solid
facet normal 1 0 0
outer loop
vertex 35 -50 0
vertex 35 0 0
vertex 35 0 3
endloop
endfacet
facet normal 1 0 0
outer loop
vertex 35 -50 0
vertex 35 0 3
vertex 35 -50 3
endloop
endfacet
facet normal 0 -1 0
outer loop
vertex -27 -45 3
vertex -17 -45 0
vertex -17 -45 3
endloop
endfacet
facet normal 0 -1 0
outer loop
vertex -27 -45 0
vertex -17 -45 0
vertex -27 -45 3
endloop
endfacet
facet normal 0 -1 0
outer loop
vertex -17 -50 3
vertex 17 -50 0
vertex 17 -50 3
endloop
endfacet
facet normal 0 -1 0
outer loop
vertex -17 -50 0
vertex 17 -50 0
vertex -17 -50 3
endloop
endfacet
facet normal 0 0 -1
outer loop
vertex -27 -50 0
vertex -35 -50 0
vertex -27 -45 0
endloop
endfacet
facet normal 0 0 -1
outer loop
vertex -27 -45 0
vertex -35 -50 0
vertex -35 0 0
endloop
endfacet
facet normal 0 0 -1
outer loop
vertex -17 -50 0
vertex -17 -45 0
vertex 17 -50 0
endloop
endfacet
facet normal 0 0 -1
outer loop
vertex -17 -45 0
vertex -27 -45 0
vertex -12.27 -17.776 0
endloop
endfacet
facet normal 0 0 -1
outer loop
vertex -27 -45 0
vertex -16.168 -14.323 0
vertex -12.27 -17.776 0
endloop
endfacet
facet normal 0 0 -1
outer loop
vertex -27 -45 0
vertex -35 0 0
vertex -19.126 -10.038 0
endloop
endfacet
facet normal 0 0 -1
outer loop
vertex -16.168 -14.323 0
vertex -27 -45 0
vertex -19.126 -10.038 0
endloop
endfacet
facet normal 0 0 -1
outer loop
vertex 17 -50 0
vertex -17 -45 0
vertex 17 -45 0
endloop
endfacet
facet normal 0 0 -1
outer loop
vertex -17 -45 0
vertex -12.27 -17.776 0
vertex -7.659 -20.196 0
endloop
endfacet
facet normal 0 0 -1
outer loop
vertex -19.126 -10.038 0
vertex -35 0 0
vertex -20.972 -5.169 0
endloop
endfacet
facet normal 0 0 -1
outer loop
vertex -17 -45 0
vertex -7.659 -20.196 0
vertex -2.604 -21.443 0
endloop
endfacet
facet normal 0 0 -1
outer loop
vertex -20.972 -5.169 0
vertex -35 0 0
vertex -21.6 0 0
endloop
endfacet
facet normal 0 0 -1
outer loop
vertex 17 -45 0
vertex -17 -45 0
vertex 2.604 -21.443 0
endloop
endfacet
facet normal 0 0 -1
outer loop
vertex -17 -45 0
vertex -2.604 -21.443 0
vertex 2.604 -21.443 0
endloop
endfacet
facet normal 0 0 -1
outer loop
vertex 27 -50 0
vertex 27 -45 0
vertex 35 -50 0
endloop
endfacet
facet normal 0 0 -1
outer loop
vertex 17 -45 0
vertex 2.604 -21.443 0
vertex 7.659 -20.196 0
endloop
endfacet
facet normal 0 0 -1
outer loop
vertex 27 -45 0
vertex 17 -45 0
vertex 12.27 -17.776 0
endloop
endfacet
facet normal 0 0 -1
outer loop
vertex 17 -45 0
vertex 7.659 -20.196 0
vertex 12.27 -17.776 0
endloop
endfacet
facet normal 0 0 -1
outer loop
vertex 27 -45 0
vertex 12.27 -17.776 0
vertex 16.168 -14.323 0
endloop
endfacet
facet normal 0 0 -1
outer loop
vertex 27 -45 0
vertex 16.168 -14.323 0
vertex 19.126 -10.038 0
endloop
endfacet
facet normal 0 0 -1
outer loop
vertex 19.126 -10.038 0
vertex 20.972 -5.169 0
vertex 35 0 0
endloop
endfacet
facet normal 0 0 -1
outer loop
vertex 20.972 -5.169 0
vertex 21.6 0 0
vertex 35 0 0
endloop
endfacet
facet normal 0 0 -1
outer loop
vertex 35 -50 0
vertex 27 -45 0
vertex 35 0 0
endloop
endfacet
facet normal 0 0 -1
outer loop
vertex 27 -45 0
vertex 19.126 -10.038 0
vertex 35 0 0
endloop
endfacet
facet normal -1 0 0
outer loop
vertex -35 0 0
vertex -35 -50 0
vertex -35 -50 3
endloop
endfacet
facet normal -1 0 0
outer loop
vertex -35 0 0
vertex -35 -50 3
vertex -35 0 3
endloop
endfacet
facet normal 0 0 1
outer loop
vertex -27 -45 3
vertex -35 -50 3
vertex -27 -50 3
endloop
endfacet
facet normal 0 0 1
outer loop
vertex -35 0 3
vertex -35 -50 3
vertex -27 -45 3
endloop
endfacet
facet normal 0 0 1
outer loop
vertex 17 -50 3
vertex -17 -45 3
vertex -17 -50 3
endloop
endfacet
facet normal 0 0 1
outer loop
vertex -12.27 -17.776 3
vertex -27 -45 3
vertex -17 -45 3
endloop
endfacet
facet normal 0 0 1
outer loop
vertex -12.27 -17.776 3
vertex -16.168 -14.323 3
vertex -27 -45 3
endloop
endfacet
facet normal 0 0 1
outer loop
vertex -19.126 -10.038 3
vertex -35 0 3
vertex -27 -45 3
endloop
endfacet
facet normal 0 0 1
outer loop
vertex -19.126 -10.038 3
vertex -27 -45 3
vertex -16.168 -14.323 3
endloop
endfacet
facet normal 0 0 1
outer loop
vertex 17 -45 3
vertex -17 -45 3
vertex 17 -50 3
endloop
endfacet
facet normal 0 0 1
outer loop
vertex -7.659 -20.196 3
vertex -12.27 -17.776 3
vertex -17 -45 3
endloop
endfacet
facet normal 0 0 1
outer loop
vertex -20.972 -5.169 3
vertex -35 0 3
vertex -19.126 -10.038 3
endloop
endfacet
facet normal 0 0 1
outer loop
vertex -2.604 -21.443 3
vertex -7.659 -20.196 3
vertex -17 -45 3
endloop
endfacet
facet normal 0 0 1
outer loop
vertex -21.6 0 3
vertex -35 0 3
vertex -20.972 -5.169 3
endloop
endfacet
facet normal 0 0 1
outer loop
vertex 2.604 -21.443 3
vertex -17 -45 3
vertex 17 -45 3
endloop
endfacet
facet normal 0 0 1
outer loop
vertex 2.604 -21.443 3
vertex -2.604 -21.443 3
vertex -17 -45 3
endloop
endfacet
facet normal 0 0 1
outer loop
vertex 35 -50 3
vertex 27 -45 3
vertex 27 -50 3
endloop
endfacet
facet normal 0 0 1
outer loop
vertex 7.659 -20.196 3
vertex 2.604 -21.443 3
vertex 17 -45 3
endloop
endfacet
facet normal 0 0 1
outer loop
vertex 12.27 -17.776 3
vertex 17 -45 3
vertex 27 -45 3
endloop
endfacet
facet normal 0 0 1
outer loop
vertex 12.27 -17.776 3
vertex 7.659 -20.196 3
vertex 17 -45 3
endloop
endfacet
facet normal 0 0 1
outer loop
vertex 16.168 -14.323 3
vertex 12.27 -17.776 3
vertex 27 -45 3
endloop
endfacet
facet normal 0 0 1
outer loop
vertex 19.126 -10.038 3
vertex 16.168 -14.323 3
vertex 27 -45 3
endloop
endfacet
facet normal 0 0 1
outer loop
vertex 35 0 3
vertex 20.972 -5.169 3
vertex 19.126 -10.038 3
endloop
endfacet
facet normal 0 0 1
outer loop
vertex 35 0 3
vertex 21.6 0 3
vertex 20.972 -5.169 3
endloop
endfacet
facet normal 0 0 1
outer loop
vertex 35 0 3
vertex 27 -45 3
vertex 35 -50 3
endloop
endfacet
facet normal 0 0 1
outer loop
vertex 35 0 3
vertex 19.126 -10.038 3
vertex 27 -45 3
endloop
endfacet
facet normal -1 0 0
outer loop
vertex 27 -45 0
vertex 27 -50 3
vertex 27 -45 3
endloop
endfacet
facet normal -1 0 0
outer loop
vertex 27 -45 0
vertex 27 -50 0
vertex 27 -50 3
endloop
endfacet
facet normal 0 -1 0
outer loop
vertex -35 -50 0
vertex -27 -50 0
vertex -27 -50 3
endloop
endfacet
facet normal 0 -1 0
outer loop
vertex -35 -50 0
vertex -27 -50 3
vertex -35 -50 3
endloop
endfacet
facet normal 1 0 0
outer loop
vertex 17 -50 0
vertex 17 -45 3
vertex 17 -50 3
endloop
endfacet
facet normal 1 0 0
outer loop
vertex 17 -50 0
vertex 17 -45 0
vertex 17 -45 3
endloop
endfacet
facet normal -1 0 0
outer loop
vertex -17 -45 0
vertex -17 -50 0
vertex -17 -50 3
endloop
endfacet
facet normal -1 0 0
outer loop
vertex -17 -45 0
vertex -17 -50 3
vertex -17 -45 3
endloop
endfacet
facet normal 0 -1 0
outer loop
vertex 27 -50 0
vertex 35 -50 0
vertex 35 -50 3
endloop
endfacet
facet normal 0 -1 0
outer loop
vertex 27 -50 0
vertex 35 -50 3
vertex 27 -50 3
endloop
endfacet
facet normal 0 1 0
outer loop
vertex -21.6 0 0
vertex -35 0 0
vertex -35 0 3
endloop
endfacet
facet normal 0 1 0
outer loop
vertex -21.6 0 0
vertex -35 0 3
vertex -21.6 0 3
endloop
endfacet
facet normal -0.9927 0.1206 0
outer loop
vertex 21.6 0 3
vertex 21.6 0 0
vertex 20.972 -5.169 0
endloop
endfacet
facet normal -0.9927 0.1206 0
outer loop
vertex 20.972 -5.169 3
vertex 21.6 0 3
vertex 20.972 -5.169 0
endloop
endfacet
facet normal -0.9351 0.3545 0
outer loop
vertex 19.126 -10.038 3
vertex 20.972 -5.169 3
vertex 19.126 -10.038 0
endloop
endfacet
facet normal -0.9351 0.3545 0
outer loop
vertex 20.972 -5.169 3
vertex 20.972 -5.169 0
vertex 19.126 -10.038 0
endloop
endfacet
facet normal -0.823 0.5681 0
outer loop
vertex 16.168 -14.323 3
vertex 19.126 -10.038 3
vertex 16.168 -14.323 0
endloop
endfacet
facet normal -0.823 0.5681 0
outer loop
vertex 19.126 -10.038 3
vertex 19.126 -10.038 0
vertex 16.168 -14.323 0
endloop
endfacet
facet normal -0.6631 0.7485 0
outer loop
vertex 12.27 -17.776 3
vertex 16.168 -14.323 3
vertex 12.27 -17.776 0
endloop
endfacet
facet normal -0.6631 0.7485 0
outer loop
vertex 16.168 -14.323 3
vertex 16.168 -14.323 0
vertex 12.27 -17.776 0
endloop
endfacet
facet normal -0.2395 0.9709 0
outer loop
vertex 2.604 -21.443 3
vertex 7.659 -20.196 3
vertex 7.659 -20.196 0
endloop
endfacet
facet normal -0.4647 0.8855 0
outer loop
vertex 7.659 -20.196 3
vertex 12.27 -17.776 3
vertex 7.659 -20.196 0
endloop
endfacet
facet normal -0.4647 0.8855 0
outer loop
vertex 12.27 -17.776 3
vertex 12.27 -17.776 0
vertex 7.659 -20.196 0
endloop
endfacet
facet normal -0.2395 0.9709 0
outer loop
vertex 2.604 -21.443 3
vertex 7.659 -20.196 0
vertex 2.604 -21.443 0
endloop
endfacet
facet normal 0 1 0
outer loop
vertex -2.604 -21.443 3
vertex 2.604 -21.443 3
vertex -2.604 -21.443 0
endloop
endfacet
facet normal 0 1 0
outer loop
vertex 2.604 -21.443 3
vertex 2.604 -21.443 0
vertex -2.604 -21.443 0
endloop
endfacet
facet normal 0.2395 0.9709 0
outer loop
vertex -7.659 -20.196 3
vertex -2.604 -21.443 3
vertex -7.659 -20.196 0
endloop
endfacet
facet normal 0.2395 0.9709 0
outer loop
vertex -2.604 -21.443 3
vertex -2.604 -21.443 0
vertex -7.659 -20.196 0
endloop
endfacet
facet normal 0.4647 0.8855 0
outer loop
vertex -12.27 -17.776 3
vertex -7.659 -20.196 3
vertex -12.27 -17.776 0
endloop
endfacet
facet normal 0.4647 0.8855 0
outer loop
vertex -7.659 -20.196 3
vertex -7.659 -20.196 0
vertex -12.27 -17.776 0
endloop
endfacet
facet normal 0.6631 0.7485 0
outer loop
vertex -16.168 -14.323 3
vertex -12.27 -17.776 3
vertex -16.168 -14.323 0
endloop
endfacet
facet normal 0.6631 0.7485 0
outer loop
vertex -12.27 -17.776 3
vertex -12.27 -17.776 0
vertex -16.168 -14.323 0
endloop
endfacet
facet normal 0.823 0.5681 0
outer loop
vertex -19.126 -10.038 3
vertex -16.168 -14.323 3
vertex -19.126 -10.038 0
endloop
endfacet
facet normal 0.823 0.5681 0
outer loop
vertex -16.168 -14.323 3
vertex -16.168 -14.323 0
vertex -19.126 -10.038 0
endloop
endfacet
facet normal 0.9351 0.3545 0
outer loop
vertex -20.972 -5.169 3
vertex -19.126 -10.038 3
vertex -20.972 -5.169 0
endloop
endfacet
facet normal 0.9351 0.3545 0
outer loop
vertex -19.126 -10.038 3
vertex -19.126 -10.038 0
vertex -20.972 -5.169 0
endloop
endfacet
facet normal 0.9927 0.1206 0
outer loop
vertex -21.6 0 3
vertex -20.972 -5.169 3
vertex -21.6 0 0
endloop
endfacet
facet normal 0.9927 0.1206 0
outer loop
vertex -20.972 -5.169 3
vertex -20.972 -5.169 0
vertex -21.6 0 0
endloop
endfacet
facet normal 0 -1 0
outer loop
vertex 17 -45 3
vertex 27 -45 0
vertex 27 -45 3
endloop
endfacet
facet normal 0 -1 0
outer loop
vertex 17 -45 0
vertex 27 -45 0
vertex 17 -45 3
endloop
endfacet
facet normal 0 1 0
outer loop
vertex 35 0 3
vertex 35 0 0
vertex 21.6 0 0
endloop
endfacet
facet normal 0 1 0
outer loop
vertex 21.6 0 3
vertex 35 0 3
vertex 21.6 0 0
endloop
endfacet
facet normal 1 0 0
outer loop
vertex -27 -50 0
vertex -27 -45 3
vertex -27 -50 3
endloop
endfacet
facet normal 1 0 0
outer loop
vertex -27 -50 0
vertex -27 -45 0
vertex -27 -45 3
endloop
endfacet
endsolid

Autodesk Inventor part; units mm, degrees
ref_plane "YZ Plane" through (0, 0, 0) normal (1, 0, 0) x (0, 1, 0)
ref_plane "XZ Plane" through (0, 0, 0) normal (0, 1, 0) x (-1, 0, 0)
ref_plane "XY Plane" through (0, 0, 0) normal (0, 0, 1) x (1, 0, 0)
sketch "Esquisse1" plane through (0, 0, 0) normal (0, 0, 1) x (1, 0, 0)
  line L0 (0, -14) -> (0, 14) construction
  circle A0 centre (0, 0) radius 30 construction
  line L1 (0, 0) -> (35, 0) construction
  line L2 (0, 0) -> (-35, 0) construction
  line L3 (-35, 0) -> (35, 0) construction
  line L4 (35, 0) -> (35, -50)
  line L5 (-35, -50) -> (-35, 0)
  line L6 (-49, 0) -> (49, 0) construction
  line L7 (0, -66) -> (0, 46) construction
  arc A1 (-21.6, 0) -> (21.6, 0) centre (0, 0) ccw
  line L8 (-35, 0) -> (-21.6, 0)
  line L9 (35, 0) -> (21.6, 0)
  line L10 (-17, -50) -> (-17, -45)
  line L11 (-17, -45) -> (-27, -45)
  line L12 (-27, -45) -> (-27, -50)
  line L13 (27, -50) -> (27, -45)
  line L14 (27, -45) -> (17, -45)
  line L15 (17, -45) -> (17, -50)
  line L16 (-27, -50) -> (-35, -50)
  line L17 (35, -50) -> (27, -50)
  line L18 (17, -50) -> (-17, -50)
  line L19 (0, 0) -> (21.6, 0) construction
  line L20 (30, 0) -> (35, 0) construction
  dimension "d8" = 60
  dimension "d12" = 70
  dimension "d23" = 35
  dimension "d25" = 21.6
  dimension "d26" = 10
  dimension "d28" = 10
  dimension "d30" = 8
  dimension "d31" = 8
  dimension "d32" = 5
  dimension "d33" = 5
  dimension "d34" = 5
  dimension "d35" = 50
  dimension "d36" = 5
extrude "Extrusion1" add sketch "Esquisse1" along normal blind 3
properties part number "Support_motor_front_2"
